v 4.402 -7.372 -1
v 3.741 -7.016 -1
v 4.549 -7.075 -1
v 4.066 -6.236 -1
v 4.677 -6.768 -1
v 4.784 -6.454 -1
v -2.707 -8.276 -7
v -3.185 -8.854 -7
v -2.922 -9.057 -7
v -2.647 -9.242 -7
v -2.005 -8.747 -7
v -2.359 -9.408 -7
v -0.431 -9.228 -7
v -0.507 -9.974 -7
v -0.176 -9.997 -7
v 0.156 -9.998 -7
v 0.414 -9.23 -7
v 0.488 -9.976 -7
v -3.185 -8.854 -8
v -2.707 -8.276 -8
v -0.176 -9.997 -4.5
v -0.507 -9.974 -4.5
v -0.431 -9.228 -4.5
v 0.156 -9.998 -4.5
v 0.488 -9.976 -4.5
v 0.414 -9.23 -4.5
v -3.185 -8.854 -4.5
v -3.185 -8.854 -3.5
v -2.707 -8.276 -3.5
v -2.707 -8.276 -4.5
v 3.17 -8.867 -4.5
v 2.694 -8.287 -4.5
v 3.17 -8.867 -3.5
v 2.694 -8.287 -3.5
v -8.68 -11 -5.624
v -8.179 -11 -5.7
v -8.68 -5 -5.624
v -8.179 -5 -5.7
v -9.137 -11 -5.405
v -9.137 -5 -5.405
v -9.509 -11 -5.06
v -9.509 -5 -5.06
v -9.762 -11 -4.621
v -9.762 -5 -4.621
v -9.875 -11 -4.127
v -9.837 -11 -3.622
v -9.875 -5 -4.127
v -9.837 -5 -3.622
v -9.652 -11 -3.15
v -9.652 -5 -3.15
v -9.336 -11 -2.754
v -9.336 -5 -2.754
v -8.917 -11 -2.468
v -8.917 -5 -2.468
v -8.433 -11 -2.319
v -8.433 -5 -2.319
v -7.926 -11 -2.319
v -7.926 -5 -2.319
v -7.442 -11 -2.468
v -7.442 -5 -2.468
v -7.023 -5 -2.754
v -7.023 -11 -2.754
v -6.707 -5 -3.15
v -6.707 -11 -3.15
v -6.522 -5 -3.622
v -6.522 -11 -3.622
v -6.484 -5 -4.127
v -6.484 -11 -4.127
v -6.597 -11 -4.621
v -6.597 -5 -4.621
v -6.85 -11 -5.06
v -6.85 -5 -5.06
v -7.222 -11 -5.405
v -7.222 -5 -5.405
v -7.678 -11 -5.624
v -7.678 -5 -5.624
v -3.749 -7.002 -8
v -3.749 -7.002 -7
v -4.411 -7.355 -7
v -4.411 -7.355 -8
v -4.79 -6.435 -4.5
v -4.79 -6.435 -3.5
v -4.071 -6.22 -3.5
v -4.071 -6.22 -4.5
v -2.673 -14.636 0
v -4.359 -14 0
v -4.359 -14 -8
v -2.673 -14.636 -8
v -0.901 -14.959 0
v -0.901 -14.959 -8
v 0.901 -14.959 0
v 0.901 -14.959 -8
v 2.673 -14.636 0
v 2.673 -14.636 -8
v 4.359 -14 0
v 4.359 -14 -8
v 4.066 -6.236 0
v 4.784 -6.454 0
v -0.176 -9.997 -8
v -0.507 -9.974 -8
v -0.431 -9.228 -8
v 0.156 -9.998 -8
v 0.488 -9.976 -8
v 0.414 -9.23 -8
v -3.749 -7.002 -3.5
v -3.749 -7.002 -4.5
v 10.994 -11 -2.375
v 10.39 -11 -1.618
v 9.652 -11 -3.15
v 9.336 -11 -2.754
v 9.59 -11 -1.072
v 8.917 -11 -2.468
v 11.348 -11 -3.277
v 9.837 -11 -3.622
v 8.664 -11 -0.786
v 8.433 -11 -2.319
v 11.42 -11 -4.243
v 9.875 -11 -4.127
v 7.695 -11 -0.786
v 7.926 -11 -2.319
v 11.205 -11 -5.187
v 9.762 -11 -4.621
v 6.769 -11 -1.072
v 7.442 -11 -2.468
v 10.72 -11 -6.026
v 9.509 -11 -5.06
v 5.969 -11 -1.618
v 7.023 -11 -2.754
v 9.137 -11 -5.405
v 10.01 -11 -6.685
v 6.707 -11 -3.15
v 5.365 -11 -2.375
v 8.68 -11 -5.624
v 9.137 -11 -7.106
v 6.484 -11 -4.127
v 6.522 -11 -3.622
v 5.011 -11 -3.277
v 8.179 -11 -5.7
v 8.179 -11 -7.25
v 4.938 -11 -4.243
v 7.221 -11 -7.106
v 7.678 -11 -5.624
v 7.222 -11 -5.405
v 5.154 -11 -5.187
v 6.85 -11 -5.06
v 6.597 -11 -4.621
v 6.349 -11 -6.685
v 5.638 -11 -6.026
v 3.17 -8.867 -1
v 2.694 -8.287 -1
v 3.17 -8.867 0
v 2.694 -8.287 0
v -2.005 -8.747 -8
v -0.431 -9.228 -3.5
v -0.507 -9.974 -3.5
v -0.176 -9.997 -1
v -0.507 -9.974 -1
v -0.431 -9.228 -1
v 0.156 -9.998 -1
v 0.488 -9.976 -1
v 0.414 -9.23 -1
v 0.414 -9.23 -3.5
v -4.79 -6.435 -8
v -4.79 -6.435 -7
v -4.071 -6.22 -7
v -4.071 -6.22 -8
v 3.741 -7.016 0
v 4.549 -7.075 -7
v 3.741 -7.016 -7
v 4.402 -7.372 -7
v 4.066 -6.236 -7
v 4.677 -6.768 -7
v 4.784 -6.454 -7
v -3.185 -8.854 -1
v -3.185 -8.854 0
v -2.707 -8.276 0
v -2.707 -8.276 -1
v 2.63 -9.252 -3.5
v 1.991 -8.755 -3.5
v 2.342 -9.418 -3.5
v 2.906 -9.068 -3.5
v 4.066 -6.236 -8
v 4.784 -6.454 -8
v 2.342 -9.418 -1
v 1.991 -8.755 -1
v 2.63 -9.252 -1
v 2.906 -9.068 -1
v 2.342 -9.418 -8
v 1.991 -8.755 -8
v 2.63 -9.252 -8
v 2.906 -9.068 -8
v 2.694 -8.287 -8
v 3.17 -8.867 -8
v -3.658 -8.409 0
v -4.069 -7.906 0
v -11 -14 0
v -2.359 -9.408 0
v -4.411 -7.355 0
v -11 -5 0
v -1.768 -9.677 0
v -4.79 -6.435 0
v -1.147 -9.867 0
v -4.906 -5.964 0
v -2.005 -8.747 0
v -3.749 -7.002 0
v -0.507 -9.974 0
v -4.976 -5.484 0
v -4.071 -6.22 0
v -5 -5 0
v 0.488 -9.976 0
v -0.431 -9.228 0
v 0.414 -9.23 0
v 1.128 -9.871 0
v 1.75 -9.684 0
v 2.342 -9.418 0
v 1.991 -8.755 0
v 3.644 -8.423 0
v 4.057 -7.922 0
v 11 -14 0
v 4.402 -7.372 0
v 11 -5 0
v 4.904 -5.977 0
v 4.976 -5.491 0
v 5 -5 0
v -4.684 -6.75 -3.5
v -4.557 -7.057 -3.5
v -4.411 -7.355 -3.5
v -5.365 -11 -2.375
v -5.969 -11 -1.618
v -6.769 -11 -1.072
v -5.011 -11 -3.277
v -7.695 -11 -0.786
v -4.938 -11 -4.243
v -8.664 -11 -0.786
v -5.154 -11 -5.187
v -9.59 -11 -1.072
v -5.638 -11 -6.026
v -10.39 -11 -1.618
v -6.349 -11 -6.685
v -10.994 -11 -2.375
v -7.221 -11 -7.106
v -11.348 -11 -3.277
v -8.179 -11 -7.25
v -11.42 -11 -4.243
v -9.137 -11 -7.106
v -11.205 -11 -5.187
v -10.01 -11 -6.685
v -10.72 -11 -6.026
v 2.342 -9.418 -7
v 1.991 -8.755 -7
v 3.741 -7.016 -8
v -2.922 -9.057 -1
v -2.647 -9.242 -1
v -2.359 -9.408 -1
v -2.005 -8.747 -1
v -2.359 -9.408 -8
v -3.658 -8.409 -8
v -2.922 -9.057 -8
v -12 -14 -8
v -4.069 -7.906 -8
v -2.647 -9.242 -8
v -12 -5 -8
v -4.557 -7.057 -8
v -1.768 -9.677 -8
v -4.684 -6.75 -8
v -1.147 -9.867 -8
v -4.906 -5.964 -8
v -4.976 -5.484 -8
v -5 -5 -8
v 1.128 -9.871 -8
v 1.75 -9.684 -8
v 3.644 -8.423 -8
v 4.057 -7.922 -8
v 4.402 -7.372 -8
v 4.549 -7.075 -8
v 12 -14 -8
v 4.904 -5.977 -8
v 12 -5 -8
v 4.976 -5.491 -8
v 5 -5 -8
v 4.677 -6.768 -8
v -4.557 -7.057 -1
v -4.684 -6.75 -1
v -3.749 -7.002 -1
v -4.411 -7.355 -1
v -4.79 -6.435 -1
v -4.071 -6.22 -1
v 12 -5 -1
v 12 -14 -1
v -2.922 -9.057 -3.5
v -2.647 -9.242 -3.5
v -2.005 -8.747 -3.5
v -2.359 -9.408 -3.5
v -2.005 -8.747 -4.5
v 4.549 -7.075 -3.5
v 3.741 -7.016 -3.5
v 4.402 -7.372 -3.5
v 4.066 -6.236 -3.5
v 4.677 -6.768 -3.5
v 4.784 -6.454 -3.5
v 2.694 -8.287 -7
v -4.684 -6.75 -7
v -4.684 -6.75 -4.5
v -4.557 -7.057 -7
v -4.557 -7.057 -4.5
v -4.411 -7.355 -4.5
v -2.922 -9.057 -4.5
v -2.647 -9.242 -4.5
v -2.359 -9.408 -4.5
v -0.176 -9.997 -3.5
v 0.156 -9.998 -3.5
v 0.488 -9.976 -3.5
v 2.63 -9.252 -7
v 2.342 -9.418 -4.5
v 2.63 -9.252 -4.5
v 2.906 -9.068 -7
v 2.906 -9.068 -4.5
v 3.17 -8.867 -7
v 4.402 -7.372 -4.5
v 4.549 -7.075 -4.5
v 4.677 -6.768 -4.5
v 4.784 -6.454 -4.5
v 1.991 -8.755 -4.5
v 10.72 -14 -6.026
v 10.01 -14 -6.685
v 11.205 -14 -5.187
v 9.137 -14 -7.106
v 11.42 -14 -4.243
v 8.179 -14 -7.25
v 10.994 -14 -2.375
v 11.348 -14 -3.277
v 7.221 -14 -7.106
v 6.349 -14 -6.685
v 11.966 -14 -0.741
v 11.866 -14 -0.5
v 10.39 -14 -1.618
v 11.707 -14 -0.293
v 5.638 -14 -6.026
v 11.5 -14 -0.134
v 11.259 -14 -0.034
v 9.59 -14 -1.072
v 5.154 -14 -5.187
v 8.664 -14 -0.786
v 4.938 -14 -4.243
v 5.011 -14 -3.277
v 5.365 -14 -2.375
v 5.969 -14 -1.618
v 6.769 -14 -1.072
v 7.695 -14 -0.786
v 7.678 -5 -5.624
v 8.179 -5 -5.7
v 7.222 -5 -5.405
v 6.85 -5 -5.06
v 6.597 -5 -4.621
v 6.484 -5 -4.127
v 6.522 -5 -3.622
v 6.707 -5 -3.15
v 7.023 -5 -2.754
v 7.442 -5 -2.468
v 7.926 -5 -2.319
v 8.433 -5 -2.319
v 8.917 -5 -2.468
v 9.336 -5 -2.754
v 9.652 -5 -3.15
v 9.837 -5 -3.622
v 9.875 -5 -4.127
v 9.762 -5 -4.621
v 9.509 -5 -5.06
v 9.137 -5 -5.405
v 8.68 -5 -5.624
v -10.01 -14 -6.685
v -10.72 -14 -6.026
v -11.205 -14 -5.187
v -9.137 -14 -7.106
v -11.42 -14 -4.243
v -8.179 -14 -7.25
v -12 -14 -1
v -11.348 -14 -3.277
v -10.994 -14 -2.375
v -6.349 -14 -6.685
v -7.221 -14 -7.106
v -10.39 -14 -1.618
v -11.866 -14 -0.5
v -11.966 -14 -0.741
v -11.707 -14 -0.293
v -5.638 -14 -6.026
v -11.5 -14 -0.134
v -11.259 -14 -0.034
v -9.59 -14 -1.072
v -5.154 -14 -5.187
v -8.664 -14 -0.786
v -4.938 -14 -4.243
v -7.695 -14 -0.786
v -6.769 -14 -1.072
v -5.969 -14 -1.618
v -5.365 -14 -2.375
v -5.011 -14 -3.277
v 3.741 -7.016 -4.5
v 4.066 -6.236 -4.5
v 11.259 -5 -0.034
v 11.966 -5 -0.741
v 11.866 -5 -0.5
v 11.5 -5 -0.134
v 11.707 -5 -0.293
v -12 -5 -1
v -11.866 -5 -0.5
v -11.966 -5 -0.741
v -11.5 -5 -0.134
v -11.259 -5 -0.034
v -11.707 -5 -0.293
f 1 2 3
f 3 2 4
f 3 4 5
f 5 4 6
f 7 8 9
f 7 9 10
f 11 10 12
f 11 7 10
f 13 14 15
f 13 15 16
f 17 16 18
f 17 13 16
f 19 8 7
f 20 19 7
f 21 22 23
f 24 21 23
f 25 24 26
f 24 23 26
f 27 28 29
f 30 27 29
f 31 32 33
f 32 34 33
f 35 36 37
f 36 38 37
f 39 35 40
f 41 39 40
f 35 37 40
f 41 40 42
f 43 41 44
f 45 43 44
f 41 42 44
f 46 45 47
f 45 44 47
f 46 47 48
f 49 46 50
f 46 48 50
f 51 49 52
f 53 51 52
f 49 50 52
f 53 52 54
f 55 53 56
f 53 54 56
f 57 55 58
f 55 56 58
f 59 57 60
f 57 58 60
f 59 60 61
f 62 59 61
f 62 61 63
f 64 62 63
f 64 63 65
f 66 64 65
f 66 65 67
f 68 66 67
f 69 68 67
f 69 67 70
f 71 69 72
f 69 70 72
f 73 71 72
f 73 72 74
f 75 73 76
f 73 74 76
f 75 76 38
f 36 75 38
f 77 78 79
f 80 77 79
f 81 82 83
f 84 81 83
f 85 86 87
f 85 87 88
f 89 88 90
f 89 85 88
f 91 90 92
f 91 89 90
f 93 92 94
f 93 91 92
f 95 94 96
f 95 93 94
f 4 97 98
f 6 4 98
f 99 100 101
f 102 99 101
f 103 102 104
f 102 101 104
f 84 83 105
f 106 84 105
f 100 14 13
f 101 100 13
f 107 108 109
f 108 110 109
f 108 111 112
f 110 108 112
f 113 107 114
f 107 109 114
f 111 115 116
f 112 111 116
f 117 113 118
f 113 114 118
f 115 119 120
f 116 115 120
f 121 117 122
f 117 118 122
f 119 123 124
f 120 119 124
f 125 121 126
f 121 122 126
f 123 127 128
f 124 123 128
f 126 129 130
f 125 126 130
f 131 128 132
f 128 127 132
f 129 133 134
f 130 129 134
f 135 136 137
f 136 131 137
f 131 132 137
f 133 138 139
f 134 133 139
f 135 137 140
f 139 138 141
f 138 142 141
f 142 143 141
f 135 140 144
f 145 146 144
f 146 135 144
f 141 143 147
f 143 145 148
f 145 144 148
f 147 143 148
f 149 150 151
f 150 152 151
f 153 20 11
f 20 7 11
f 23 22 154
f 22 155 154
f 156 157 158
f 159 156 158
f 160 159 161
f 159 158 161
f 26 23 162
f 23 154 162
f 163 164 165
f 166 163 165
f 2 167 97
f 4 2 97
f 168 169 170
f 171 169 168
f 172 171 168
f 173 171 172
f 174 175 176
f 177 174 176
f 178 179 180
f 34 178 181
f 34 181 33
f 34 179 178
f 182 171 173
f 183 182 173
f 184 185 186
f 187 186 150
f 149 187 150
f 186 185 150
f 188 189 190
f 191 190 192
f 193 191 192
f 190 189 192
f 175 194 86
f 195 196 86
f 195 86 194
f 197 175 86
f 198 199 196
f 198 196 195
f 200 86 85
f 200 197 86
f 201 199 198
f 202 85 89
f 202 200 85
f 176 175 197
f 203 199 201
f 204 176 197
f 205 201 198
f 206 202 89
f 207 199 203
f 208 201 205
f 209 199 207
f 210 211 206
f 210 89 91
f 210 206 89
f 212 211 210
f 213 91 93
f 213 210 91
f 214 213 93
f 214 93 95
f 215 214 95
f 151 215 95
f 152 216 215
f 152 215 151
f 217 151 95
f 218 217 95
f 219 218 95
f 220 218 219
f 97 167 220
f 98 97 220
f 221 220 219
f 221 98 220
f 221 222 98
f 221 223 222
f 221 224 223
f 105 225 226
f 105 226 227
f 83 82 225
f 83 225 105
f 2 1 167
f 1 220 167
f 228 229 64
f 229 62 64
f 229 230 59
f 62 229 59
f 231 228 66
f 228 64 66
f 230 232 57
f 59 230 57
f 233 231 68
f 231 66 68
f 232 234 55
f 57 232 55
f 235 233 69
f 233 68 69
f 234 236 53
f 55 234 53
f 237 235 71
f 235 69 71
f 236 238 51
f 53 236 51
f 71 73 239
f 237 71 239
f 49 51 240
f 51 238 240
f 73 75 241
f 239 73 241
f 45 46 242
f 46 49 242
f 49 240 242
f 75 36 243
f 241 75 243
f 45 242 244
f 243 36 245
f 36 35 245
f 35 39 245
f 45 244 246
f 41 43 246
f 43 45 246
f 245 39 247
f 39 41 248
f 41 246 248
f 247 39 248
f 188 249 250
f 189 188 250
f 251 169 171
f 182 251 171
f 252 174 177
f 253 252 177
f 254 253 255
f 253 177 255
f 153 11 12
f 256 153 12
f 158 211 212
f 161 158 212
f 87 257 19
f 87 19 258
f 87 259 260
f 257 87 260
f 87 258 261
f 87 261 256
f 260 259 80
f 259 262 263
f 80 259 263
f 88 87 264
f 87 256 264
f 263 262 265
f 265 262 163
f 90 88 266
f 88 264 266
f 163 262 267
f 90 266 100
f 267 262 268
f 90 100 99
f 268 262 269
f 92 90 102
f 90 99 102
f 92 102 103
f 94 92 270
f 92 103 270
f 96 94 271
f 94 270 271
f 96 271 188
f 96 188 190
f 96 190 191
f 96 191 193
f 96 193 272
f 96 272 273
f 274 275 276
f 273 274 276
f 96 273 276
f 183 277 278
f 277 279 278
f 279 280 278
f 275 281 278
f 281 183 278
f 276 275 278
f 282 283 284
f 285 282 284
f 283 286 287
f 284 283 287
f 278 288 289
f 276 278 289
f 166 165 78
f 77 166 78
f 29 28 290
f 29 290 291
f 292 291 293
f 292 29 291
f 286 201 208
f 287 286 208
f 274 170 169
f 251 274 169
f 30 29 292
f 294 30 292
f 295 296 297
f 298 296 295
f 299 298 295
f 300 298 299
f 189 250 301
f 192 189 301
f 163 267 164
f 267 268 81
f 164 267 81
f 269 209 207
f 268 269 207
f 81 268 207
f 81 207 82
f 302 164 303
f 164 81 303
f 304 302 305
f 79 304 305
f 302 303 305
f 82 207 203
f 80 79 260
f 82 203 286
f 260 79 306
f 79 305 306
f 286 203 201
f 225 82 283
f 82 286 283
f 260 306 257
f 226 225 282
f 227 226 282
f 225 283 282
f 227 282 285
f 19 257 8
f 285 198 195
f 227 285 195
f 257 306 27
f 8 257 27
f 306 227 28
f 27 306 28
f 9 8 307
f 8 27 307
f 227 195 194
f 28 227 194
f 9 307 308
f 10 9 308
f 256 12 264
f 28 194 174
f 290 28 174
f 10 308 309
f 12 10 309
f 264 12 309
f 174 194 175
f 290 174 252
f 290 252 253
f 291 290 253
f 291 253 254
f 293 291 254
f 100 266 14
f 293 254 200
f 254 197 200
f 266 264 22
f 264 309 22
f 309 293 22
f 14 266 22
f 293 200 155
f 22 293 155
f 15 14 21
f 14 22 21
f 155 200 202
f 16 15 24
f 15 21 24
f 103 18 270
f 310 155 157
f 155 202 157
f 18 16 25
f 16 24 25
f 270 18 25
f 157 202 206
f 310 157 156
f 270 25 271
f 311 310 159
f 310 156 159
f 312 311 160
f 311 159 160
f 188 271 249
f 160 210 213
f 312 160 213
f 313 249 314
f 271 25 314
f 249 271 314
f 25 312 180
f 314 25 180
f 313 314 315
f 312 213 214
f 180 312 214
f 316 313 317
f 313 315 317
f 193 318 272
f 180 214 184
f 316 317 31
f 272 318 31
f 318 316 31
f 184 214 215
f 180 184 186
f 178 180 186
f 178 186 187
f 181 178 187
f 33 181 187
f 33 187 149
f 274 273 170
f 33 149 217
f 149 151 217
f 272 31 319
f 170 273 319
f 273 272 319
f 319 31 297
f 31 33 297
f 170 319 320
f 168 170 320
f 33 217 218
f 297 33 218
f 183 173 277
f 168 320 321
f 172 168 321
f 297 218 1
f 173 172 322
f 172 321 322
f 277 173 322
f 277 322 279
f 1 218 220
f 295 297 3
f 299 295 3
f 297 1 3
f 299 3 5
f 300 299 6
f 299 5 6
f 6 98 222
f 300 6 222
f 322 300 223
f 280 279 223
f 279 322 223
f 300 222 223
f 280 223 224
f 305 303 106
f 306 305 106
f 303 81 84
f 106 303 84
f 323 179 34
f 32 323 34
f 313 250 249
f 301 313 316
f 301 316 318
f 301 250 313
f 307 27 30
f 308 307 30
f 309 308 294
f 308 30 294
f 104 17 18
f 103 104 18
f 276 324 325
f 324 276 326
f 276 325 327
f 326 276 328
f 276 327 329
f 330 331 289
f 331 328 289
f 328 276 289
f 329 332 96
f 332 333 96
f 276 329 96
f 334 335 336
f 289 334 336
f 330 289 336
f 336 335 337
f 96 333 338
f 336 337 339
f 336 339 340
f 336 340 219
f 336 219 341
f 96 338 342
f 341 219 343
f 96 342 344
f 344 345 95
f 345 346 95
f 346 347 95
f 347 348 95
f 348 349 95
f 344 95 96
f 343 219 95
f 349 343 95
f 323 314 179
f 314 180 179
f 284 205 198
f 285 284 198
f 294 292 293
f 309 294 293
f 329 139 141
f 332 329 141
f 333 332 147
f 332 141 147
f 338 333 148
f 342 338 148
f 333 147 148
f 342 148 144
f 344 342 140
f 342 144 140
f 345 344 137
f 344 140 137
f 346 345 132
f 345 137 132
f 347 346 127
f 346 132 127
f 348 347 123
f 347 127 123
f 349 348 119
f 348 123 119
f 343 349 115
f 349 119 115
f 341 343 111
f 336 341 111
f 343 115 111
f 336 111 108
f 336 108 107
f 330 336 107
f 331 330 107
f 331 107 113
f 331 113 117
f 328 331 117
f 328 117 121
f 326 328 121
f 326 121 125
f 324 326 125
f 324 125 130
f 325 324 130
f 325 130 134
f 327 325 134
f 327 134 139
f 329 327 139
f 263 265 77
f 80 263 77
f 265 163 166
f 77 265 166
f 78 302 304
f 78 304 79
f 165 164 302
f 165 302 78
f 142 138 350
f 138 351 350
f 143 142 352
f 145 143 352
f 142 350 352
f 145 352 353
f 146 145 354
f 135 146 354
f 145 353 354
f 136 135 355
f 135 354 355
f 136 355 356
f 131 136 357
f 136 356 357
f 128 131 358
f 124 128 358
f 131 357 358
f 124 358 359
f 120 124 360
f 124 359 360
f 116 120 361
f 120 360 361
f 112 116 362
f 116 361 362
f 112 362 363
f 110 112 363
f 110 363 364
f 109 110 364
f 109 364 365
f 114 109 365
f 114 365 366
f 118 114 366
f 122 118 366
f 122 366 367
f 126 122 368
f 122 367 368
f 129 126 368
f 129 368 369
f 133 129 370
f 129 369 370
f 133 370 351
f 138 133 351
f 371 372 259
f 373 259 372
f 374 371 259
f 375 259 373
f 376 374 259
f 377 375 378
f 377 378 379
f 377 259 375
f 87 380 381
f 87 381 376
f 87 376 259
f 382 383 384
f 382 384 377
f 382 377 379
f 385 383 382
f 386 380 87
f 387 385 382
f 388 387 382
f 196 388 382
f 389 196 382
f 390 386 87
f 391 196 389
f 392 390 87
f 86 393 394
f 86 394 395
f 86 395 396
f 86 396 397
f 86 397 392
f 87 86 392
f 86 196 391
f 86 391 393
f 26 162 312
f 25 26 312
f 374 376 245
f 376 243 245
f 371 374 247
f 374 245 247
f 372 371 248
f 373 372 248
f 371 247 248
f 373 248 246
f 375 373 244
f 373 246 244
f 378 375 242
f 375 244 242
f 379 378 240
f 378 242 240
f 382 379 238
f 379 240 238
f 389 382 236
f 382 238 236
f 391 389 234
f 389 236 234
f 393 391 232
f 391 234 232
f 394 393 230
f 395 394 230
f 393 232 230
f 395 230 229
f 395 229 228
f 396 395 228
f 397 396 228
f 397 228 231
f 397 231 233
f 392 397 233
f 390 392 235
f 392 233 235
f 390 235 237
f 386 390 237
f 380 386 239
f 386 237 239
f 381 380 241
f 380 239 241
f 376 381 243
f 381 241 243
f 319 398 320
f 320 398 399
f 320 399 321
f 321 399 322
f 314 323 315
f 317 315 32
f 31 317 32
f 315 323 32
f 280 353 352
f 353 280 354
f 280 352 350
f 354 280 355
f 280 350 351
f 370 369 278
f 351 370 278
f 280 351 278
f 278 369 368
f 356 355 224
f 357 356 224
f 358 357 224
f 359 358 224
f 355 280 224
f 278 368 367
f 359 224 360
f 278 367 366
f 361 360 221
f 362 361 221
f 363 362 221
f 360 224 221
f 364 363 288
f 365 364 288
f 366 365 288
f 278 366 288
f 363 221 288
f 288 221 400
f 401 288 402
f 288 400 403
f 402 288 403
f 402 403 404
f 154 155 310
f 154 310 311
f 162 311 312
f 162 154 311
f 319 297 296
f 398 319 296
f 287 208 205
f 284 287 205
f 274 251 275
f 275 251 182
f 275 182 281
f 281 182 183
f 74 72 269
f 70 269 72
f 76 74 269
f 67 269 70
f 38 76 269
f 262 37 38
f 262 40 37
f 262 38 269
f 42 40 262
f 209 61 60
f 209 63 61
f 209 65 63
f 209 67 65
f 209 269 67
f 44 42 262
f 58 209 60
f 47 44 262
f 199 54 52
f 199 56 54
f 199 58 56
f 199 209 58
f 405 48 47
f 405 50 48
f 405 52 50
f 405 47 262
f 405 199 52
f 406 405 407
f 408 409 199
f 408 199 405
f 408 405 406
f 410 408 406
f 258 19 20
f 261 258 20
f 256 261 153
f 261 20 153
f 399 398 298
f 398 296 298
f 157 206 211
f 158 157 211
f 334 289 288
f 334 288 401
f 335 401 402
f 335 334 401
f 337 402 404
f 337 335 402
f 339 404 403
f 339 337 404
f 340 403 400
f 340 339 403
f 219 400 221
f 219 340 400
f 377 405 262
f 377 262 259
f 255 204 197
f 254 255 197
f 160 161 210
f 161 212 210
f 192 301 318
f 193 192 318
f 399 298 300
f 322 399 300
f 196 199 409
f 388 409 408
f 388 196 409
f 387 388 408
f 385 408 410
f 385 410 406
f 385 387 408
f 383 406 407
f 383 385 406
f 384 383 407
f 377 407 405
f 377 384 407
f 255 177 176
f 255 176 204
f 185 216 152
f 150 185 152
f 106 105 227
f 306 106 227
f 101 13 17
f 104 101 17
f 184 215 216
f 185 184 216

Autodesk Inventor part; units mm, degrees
ref_plane "YZ Plane" through (0, 0, 0) normal (1, 0, 0) x (0, 1, 0)
ref_plane "XZ Plane" through (0, 0, 0) normal (0, 1, 0) x (-1, 0, 0)
sketch "Sketch1" plane through (0, 0, 0) normal (0, 0, 1) x (1, 0, 0)
  arc A0 (5, -5) -> (-5, -5) centre (0, -5) ccw projected
  circle A1 centre (0, -5) radius 5
  arc A2 (4.3589, 4) -> (-4.3589, 4) centre (0, -5) ccw projected
  line L0 (12, -5) -> (12, 4) projected
  line L1 (11, 4) -> (4.3589, 4) projected
  line L2 (12, 4) -> (0, 4)
  line L3 (0, 4) -> (0, -5)
  line L4 (0, -5) -> (12, -5)
  line L5 (12, -5) -> (12, 4)
  arc A3 (-4.3589, -14) -> (4.3589, -14) centre (0, -5) ccw
  line L6 (12, -5) -> (12, -14)
  line L7 (12, -14) -> (0, -14)
  line L8 (-12, -5) -> (-12, 4)
  line L9 (-12, 4) -> (0, 4)
  line L10 (0, -5) -> (-12, -5)
  line L11 (-12, -14) -> (0, -14)
  line L12 (-12, -5) -> (-12, -14)
  circle A4 centre (0, -5) radius 10
  point P0 (0, 0)
ref_plane "Work Plane1" through (-11, -5, -8) normal (0, 0, -1) x (0, 1, 0)
extrude "Extrusion1" add sketch "Sketch1" against normal up to surface (8 mm away) contours L4 A4 L7 L11 L10 A1 | L4 L6 L7 A4 | A4 L11 L12 L10 | A3 L11 L7
sketch "Sketch2" plane through (4.3589, -14, 0) normal (0, -1, 0) x (1, 0, 0)
  circle A0 centre (3.8206, -4) radius 1.7 projected
  circle A1 centre (-12.5383, -4) radius 1.7 projected
  point P0 (-4.3589, 0)
hole "Hole1" at (-8.1794, -14, -4) at (8.1794, -14, -4) direction (0, 1, 0) diameter 3.4 end through all counterbore diameter 6.5 counterbore depth 3 clearance for "Socket Head Cap Screw" size "M3" standard "Ansi Metric M Profile"
fillet "Fillet1" radius 1 2 edges at (12, -9.5, 0) (-12, -9.5, 0)
sketch "Sketch3" plane through (0, 0, 0) normal (0, 0, 1) x (1, 0, 0)
  line L0 (-8, 4.75) -> (11, 4.75) projected
  line L1 (-8, 4.75) -> (-8, -5) projected
  line L2 (-8, -5) -> (-5, -5) projected
  arc A0 (-4.7896, -3.5647) -> (-5, -5) centre (0, -5) ccw projected
  line L3 (-4.7896, -3.5647) -> (-4.0711, -3.78) projected
  line L4 (-4.0711, -3.78) -> (-3.7492, -2.9985) projected
  line L5 (-3.7492, -2.9985) -> (-4.4108, -2.6453) projected
  arc A1 (-3.185, -1.1457) -> (-4.4108, -2.6453) centre (0, -5) ccw projected
  line L6 (-3.185, -1.1457) -> (-2.7072, -1.7238) projected
  line L7 (-2.7072, -1.7238) -> (-2.0054, -1.2529) projected
  line L8 (-2.0054, -1.2529) -> (-2.3593, -0.5916) projected
  arc A2 (-0.5069, -0.0258) -> (-2.3593, -0.5916) centre (0, -5) ccw projected
  line L9 (-0.5069, -0.0258) -> (-0.4308, -0.7719) projected
  line L10 (-0.4308, -0.7719) -> (0.4144, -0.7702) projected
  line L11 (0.4144, -0.7702) -> (0.4875, -0.0238) projected
  arc A3 (2.3421, -0.5825) -> (0.4875, -0.0238) centre (0, -5) ccw projected
  line L12 (2.3421, -0.5825) -> (1.9908, -1.2451) projected
  line L13 (1.9908, -1.2451) -> (2.6945, -1.7133) projected
  line L14 (2.6945, -1.7133) -> (3.17, -1.1333) projected
  arc A4 (4.4016, -2.6282) -> (3.17, -1.1333) centre (0, -5) ccw projected
  line L15 (4.4016, -2.6282) -> (3.7414, -2.9839) projected
  line L16 (3.7414, -2.9839) -> (4.0664, -3.7642) projected
  line L17 (4.0664, -3.7642) -> (4.7839, -3.5461) projected
  arc A5 (5, -5) -> (4.7839, -3.5461) centre (0, -5) ccw projected
  line L18 (5, -5) -> (11, -5) projected
  line L19 (11, 4.75) -> (11, -5) projected
  circle A6 centre (0, -5) radius 5
  line L20 (-4.7896, -6.4353) -> (-4.0711, -6.22)
  line L21 (-4.0711, -6.22) -> (-3.7492, -7.0015)
  line L22 (-3.7492, -7.0015) -> (-4.4108, -7.3547)
  arc A7 (-4.4108, -7.3547) -> (-3.185, -8.8543) centre (0, -5) ccw
  line L23 (-3.185, -8.8543) -> (-2.7072, -8.2762)
  line L24 (-2.7072, -8.2762) -> (-2.0054, -8.7471)
  line L25 (-2.0054, -8.7471) -> (-2.3593, -9.4084)
  arc A8 (-2.3593, -9.4084) -> (-0.5069, -9.9742) centre (0, -5) ccw
  line L26 (-0.5069, -9.9742) -> (-0.4308, -9.2281)
  line L27 (-0.4308, -9.2281) -> (0.4144, -9.2298)
  line L28 (0.4144, -9.2298) -> (0.4875, -9.9762)
  arc A9 (0.4875, -9.9762) -> (2.3421, -9.4175) centre (0, -5) ccw
  line L29 (2.3421, -9.4175) -> (1.9908, -8.7549)
  line L30 (1.9908, -8.7549) -> (2.6945, -8.2867)
  line L31 (2.6945, -8.2867) -> (3.17, -8.8667)
  arc A10 (3.17, -8.8667) -> (4.4016, -7.3718) centre (0, -5) ccw
  line L32 (4.4016, -7.3718) -> (3.7414, -7.0161)
  line L33 (3.7414, -7.0161) -> (4.0664, -6.2358)
  line L34 (4.0664, -6.2358) -> (4.7839, -6.4539)
  point P0 (0, 0)
  point P1 (0, -10)
  point P2 (-4.4108, -7.3547)
  point P3 (-0.5069, -9.9742)
  point P4 (2.3421, -9.4175)
  point P5 (4.4016, -7.3718)
extrude "Extrusion2" add sketch "Sketch3" against normal blind 1 contours L20 L21 L22 A6 | A6 L32 L33 L34 | L23 L24 L25 A6 | A6 L29 L30 L31 | L26 L27 L28 A6
pattern_linear "Rectangular Pattern1" count 3 spacing 3.5 along (0, 0, -1) of "Extrusion2"
properties part number "Bed Cable Harness Cable Clamp"
